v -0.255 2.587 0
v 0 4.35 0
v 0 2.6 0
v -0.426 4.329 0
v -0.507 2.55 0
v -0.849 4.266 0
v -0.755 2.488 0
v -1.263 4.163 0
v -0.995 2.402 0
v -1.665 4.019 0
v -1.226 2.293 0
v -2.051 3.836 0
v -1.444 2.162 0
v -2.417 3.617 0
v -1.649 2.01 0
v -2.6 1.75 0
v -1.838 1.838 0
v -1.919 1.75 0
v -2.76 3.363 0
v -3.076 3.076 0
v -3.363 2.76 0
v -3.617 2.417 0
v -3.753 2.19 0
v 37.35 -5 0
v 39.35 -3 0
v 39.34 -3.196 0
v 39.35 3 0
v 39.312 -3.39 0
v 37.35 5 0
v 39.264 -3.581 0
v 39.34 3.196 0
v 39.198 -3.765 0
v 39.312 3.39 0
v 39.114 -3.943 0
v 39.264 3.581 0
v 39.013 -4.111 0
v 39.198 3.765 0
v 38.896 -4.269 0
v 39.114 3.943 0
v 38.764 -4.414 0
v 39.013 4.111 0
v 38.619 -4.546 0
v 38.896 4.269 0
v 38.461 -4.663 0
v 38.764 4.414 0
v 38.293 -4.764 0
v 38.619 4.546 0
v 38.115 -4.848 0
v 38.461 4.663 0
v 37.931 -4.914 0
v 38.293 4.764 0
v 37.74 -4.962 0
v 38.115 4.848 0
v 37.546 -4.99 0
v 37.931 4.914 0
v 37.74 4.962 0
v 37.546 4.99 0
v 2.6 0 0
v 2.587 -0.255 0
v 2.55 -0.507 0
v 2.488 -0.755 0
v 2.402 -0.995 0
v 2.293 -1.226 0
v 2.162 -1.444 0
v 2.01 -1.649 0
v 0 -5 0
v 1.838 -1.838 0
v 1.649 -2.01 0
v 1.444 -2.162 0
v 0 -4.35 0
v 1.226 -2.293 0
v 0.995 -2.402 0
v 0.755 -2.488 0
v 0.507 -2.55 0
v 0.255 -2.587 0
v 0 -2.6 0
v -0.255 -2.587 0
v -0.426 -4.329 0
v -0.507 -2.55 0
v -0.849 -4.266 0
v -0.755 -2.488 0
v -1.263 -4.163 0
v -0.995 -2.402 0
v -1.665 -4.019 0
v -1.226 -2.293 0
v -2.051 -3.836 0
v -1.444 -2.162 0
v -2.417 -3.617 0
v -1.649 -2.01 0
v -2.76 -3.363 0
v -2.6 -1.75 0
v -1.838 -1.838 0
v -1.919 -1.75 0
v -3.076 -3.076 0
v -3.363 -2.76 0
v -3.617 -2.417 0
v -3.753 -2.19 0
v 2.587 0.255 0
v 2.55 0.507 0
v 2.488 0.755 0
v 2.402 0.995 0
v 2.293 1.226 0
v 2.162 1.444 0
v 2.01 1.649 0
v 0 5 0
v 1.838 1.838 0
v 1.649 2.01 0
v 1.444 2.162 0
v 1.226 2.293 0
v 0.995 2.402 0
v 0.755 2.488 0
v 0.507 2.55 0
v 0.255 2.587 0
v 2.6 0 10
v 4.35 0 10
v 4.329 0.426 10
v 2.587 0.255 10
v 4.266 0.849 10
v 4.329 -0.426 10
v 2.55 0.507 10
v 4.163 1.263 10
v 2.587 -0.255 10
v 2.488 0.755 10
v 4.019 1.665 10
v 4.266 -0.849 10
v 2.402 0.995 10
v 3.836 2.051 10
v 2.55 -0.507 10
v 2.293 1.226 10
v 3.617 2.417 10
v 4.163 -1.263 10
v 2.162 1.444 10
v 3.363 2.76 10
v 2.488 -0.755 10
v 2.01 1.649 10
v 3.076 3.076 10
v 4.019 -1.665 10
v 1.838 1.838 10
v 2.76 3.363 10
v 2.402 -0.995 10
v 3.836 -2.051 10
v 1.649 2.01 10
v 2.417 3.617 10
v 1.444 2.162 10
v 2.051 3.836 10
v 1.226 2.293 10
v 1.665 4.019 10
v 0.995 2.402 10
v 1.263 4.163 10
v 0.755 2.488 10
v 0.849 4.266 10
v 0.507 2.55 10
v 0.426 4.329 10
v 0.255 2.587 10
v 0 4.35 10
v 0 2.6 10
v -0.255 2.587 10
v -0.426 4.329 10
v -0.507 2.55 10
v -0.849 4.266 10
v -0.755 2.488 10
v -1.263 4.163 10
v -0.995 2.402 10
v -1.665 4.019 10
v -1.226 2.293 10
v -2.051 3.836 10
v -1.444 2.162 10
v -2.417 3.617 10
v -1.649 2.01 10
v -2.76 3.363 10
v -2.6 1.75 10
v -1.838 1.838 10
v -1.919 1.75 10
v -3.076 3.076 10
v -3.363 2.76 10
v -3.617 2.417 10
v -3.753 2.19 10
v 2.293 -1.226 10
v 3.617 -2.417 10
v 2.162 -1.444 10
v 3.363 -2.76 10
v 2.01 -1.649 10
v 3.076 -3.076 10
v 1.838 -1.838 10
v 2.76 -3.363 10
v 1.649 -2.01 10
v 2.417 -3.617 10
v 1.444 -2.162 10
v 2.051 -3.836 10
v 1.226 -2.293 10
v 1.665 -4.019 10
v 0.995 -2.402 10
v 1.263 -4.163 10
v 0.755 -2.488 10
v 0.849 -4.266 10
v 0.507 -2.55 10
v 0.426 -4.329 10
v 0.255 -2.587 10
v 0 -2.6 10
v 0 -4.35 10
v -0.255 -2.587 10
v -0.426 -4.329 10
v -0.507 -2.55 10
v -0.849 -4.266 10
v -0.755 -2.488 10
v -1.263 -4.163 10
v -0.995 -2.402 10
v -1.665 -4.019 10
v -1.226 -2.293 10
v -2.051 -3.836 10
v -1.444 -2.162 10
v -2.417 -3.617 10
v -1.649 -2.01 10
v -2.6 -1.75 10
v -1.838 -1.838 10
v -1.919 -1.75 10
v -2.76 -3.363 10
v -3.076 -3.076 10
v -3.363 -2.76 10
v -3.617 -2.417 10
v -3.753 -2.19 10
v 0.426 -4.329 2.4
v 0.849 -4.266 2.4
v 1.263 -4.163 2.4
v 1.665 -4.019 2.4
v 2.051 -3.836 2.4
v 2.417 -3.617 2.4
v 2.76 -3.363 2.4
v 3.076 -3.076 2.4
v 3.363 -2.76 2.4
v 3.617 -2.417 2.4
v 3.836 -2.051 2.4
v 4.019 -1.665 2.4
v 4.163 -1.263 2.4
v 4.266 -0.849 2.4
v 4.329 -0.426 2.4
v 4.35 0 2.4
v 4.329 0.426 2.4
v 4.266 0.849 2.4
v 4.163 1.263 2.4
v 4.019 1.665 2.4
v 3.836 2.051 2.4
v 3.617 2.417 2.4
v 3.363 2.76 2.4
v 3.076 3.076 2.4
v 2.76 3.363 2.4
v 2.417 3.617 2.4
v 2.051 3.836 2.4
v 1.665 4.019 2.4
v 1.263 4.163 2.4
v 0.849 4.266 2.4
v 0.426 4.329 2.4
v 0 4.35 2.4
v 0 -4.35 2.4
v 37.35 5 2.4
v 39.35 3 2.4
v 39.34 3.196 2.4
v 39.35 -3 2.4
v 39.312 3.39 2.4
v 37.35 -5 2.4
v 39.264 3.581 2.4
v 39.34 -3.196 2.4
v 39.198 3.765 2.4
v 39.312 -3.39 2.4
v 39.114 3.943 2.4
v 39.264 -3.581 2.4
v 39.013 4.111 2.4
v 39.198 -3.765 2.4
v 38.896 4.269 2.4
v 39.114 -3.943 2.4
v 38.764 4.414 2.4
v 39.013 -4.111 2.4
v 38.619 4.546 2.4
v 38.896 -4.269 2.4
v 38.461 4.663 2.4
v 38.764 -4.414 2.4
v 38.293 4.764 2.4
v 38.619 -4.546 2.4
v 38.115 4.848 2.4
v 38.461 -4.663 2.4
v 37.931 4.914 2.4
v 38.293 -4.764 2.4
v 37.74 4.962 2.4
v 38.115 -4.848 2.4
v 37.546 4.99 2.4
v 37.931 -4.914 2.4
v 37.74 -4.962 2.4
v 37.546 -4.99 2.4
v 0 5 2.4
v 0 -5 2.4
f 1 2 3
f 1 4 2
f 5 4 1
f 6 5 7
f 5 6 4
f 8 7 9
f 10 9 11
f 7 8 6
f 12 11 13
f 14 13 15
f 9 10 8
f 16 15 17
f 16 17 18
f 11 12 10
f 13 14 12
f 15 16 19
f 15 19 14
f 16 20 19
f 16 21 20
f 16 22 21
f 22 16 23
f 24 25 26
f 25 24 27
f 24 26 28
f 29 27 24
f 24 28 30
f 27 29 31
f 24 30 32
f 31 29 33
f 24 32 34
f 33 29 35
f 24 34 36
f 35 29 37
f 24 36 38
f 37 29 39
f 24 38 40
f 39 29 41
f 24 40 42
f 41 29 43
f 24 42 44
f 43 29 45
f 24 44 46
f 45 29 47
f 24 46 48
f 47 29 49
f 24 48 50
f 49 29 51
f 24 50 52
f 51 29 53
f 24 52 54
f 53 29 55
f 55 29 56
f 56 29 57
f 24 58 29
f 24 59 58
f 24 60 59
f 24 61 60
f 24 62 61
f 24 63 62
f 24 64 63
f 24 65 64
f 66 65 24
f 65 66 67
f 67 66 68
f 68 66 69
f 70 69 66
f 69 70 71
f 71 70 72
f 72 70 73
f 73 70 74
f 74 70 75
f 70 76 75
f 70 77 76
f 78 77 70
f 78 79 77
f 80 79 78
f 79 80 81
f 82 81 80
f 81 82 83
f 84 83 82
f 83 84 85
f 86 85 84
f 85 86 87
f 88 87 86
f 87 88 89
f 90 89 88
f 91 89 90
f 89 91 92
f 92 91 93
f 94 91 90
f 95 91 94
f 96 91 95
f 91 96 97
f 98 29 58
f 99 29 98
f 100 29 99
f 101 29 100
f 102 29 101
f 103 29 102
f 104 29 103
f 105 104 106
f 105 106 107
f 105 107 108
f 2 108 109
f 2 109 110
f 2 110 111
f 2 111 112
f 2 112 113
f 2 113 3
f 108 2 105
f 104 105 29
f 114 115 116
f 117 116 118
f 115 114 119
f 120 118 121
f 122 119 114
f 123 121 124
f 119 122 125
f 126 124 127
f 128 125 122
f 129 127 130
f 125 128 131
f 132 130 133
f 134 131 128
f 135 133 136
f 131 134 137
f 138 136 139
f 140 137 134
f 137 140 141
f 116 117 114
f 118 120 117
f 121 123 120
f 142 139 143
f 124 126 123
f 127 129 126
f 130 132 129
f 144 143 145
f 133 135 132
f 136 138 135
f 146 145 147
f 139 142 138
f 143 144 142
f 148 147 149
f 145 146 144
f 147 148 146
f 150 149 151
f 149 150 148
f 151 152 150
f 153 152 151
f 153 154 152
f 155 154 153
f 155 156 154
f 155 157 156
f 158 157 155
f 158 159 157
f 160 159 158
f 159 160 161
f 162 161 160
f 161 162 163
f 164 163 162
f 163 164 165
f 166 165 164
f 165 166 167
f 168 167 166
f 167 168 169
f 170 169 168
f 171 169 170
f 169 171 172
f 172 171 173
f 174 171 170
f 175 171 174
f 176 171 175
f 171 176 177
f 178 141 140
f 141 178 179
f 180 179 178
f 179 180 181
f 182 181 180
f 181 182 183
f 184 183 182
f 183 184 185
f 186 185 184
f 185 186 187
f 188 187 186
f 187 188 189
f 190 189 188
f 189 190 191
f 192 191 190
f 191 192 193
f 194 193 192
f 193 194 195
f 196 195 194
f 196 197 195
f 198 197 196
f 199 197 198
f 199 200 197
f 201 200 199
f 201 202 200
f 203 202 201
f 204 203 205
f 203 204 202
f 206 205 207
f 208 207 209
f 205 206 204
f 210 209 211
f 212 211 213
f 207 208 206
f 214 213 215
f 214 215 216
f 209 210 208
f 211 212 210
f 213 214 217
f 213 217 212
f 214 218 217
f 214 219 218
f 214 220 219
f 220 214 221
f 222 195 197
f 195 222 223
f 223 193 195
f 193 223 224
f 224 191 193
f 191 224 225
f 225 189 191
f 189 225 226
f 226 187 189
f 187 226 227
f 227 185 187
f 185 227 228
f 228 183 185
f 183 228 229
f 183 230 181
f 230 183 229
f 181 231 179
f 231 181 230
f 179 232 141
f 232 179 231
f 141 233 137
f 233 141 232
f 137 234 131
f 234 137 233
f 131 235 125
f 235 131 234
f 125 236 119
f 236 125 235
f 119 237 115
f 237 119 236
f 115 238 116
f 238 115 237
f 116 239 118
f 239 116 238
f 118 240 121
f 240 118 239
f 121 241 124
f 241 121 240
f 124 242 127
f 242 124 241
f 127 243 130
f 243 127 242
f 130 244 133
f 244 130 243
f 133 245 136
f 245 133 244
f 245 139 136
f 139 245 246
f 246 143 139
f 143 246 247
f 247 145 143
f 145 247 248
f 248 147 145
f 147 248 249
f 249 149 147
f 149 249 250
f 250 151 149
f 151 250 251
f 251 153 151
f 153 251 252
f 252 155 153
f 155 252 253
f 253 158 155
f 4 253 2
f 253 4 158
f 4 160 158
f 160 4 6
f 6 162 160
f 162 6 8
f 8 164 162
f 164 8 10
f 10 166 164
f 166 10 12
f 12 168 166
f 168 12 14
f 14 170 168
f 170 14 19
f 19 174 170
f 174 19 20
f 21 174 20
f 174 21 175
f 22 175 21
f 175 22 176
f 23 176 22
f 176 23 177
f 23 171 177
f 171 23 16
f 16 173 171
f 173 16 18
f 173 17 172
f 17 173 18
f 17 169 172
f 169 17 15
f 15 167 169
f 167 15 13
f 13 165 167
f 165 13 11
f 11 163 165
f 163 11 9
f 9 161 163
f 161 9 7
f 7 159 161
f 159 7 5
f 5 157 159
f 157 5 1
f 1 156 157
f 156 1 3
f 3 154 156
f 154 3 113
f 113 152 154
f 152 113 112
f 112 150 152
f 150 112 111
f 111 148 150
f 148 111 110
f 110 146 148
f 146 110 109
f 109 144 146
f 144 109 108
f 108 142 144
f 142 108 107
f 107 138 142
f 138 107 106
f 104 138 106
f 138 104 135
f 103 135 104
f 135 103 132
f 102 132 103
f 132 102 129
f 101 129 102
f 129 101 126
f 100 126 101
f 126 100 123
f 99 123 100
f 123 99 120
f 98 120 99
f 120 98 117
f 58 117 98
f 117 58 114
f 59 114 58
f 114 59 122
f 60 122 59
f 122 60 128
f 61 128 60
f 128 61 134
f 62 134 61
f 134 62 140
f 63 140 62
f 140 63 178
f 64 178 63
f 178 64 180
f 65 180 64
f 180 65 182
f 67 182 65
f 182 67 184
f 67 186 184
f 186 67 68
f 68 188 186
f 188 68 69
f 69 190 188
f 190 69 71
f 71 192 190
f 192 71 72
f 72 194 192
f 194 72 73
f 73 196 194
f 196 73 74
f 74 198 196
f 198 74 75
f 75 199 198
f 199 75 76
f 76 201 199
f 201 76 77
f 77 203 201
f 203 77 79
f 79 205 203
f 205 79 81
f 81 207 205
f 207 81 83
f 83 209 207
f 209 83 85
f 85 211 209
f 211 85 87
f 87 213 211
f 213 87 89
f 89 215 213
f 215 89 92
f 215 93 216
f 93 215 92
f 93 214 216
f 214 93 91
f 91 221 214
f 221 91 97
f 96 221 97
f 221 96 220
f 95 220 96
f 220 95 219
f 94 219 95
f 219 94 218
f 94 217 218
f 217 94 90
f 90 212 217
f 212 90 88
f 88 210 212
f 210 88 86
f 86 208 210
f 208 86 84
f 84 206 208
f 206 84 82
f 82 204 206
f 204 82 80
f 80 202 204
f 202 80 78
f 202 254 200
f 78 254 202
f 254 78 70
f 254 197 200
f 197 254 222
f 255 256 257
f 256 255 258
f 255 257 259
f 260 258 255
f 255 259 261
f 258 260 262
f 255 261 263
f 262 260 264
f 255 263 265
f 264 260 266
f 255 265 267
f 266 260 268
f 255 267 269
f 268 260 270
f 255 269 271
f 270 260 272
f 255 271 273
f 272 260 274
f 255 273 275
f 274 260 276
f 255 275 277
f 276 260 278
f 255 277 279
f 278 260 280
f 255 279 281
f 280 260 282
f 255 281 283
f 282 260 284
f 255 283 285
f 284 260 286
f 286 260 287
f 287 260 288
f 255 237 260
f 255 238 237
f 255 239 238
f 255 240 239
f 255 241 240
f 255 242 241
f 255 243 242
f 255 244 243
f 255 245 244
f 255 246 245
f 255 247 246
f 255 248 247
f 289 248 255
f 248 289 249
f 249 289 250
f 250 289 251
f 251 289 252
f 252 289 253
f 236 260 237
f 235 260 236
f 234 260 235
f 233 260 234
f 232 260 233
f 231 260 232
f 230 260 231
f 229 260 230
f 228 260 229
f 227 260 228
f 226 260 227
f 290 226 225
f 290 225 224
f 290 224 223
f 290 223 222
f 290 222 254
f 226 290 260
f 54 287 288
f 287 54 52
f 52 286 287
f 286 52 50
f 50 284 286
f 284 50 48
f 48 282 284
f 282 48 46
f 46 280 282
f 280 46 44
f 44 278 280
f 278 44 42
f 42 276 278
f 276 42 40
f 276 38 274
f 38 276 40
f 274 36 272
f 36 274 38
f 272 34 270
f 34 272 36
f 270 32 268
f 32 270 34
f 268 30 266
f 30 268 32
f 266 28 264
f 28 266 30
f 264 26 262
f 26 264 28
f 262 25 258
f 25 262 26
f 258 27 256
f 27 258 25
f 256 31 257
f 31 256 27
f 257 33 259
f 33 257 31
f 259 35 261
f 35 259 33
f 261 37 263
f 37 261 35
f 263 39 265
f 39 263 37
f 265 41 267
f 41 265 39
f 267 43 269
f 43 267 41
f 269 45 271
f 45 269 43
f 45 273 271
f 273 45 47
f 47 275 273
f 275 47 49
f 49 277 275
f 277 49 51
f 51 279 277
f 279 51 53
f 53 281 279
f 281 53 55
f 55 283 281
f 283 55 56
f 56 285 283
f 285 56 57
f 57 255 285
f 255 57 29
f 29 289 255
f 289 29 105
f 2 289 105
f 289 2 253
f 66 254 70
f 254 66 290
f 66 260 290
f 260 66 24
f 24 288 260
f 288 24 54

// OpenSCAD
// Clip-on cable label — a C-clip that snaps sideways onto a cable, carrying a
// text label.
//
// Print orientation is the point of this design. The cable axis is vertical
// (Z) in every style, so the C-clip's cross-section lies in the build plane
// and each layer is a complete C. Opening the clip to push a cable in bends
// the C within its layers, never across them, so the clip does not split
// along a layer line the way a clip printed lying down does.
//
//   flag          a flat tag lying on the bed, the clip standing up at one
//                 end. Text is inlaid flush into the top face (the last few
//                 layers). Read it looking along the cable.
//   double_sided  the same tag with the text inlaid flush into the bottom
//                 face as well, mirrored so it reads the right way round from
//                 underneath. The bottom text is the first layers on the bed,
//                 so neither side needs supports.
//   wrap_band     the clip is stretched along the cable into a band with a
//                 flat face, text inlaid into that face running along the
//                 cable, like a wrap-around label. The text is on a vertical
//                 wall, so it prints supportless but changes colour on every
//                 layer of the band's height (more purge than the flat tags).
//
// The two colour parameters are the extruder order: body_color is extruder 1,
// text_color is extruder 2.

/* [Cable] */

// Cable outer diameter in mm
cable_d = 5; // [2:0.5:15]

// Width of the clip's opening as a percentage of the cable diameter. Lower grips harder and snaps on less easily
clip_opening_pct = 70; // [55:5:85]

// Length of the clip along the cable in mm (its print height). Not used by wrap_band, where the band is the label length
clip_len = 10; // [6:1:20]

/* [Label] */

// Label text
text = "HDMI"; // 16

// Typeface (the app fills this dropdown from the fonts installed in the image)
font = "DejaVu Sans Mono:style=Bold"; // font

// Letter height in mm (text too big for the label face shrinks to fit)
text_size = 6; // [3:0.5:12]

// Length of the label in mm: tag length beyond the clip, or band length along the cable for wrap_band
flag_len = 35; // [15:1:80]

// Height of the label face in mm (the tag's width across, or the band face's width)
flag_h = 10; // [6:1:20]

// Label style
style = "flag"; // [flag:Flag tag, double_sided:Flag tag (text both sides), wrap_band:Wrap band along the cable]

/* [Colors] */

// Clip and label body (extruder 1)
body_color = "#FFFFFF"; // color

// Text (extruder 2)
text_color = "#000000"; // color

/* [Hidden] */

$fn = 64;

// Diametral clearance of the clip's bore over the cable.
clearance = 0.2;

// Clip wall: thicker for fatter cables, never under 4 perimeters of 0.4.
wall = max(1.6, 0.15 * cable_d + 1.0);

// Thickness of the flat tag.
tag_t = 2.4;

// Depth of the inlaid text: 3 layers at 0.2 mm.
inlay = 0.6;

// Clear margin between the text and the edge of its face.
margin = 1;

// Extra material between the clip's outer wall and the band's flat face.
face_standoff = 1;

eps = 0.01;

r_in = (cable_d + clearance) / 2;
r_out = r_in + wall;
opening = cable_d * clip_opening_pct / 100;
lead = wall * 0.6;          // lead-in chamfer on each jaw
face_x = r_out + face_standoff;
has_text = len(text) > 0;

// Cable slot through the -X side of the ring, widening outwards into a
// lead-in so the cable finds the opening.
module slot_2d() {
    polygon([[0, -opening / 2], [-r_in, -opening / 2],
             [-r_out - 1, -opening / 2 - lead], [-r_out - 1, opening / 2 + lead],
             [-r_in, opening / 2], [0, opening / 2]]);
}

module clip_2d() {
    difference() {
        circle(r = r_out);
        circle(r = r_in);
        slot_2d();
    }
}

// Shrink-only fits, as in models/building-brick: resize() the children plus
// a hair-thin bar of the target length, so text that already fits is left at
// text_size and larger text is scaled down uniformly instead of being cut off
// at the edge of the label face.
module fit_x(w) {
    projection(cut = true) translate([0, 0, -0.5])
        resize([w, 0, 0], auto = [false, true, false])
            union() {
                linear_extrude(1) children();
                translate([-w / 2, 0, 10]) cube([w, 0.01, 0.01]);
            }
}

module fit_y(h) {
    projection(cut = true) translate([0, 0, -0.5])
        resize([0, h, 0], auto = [true, false, false])
            union() {
                linear_extrude(1) children();
                translate([0, -h / 2, 10]) cube([0.01, h, 0.01]);
            }
}

// ---- flag / double_sided ------------------------------------------------

tag_end = r_out + flag_len;
corner = min(2, flag_h / 4);

module tag_2d() {
    difference() {
        hull() {
            translate([0, -flag_h / 2]) square([eps, flag_h]);
            translate([tag_end - corner, flag_h / 2 - corner]) circle(r = corner);
            translate([tag_end - corner, -flag_h / 2 + corner]) circle(r = corner);
        }
        circle(r = r_in);
    }
}

// Area of the tag the text may occupy: clear of the clip and the edges.
module tag_text_area_2d() {
    translate([r_out + margin, -flag_h / 2 + margin])
        square([flag_len - 2 * margin, flag_h - 2 * margin]);
}

module tag_text_2d() {
    intersection() {
        translate([r_out + flag_len / 2, 0])
            fit_y(flag_h - 2 * margin) fit_x(flag_len - 2 * margin)
                text(text, size = text_size, font = font,
                     halign = "center", valign = "center");
        tag_text_area_2d();
    }
}

module tag_top_text_3d(extra = 0) {
    translate([0, 0, tag_t - inlay]) linear_extrude(height = inlay + extra) tag_text_2d();
}

// Mirrored across the tag's long axis, so it reads correctly when the tag is
// turned over about that axis.
module tag_bottom_text_3d(extra = 0) {
    translate([0, 0, -extra]) linear_extrude(height = inlay + extra)
        mirror([0, 1]) tag_text_2d();
}

module tag_label() {
    color(body_color) difference() {
        union() {
            linear_extrude(height = clip_len) clip_2d();
            linear_extrude(height = tag_t) tag_2d();
        }
        if (has_text) {
            tag_top_text_3d(eps);
            if (style == "double_sided") tag_bottom_text_3d(eps);
        }
    }
    if (has_text) color(text_color) {
        tag_top_text_3d();
        if (style == "double_sided") tag_bottom_text_3d();
    }
}

// ---- wrap_band ------------------------------------------------------------

band_len = flag_len;

module band_2d() {
    difference() {
        hull() {
            circle(r = r_out);
            translate([face_x - eps, -flag_h / 2]) square([eps, flag_h]);
        }
        circle(r = r_in);
        slot_2d();
    }
}

// Text in the face's own frame: a = world Y, b = world Z. Rotated a quarter
// turn so it runs up the band, along the cable.
module band_text_2d() {
    intersection() {
        translate([0, band_len / 2]) rotate(90)
            fit_y(flag_h - 2 * margin) fit_x(band_len - 3)
                text(text, size = text_size, font = font,
                     halign = "center", valign = "center");
        translate([-flag_h / 2 + margin, 1.5]) square([flag_h - 2 * margin, band_len - 3]);
    }
}

// Maps the 2D frame onto the face: x -> Y, y -> Z, extrusion -> X.
module band_text_3d(extra = 0) {
    translate([face_x - inlay, 0, 0]) rotate([90, 0, 90])
        linear_extrude(height = inlay + extra) band_text_2d();
}

module band_label() {
    color(body_color) difference() {
        linear_extrude(height = band_len) band_2d();
        if (has_text) band_text_3d(eps);
    }
    if (has_text) color(text_color) band_text_3d();
}

if (style == "wrap_band") band_label();
else tag_label();
